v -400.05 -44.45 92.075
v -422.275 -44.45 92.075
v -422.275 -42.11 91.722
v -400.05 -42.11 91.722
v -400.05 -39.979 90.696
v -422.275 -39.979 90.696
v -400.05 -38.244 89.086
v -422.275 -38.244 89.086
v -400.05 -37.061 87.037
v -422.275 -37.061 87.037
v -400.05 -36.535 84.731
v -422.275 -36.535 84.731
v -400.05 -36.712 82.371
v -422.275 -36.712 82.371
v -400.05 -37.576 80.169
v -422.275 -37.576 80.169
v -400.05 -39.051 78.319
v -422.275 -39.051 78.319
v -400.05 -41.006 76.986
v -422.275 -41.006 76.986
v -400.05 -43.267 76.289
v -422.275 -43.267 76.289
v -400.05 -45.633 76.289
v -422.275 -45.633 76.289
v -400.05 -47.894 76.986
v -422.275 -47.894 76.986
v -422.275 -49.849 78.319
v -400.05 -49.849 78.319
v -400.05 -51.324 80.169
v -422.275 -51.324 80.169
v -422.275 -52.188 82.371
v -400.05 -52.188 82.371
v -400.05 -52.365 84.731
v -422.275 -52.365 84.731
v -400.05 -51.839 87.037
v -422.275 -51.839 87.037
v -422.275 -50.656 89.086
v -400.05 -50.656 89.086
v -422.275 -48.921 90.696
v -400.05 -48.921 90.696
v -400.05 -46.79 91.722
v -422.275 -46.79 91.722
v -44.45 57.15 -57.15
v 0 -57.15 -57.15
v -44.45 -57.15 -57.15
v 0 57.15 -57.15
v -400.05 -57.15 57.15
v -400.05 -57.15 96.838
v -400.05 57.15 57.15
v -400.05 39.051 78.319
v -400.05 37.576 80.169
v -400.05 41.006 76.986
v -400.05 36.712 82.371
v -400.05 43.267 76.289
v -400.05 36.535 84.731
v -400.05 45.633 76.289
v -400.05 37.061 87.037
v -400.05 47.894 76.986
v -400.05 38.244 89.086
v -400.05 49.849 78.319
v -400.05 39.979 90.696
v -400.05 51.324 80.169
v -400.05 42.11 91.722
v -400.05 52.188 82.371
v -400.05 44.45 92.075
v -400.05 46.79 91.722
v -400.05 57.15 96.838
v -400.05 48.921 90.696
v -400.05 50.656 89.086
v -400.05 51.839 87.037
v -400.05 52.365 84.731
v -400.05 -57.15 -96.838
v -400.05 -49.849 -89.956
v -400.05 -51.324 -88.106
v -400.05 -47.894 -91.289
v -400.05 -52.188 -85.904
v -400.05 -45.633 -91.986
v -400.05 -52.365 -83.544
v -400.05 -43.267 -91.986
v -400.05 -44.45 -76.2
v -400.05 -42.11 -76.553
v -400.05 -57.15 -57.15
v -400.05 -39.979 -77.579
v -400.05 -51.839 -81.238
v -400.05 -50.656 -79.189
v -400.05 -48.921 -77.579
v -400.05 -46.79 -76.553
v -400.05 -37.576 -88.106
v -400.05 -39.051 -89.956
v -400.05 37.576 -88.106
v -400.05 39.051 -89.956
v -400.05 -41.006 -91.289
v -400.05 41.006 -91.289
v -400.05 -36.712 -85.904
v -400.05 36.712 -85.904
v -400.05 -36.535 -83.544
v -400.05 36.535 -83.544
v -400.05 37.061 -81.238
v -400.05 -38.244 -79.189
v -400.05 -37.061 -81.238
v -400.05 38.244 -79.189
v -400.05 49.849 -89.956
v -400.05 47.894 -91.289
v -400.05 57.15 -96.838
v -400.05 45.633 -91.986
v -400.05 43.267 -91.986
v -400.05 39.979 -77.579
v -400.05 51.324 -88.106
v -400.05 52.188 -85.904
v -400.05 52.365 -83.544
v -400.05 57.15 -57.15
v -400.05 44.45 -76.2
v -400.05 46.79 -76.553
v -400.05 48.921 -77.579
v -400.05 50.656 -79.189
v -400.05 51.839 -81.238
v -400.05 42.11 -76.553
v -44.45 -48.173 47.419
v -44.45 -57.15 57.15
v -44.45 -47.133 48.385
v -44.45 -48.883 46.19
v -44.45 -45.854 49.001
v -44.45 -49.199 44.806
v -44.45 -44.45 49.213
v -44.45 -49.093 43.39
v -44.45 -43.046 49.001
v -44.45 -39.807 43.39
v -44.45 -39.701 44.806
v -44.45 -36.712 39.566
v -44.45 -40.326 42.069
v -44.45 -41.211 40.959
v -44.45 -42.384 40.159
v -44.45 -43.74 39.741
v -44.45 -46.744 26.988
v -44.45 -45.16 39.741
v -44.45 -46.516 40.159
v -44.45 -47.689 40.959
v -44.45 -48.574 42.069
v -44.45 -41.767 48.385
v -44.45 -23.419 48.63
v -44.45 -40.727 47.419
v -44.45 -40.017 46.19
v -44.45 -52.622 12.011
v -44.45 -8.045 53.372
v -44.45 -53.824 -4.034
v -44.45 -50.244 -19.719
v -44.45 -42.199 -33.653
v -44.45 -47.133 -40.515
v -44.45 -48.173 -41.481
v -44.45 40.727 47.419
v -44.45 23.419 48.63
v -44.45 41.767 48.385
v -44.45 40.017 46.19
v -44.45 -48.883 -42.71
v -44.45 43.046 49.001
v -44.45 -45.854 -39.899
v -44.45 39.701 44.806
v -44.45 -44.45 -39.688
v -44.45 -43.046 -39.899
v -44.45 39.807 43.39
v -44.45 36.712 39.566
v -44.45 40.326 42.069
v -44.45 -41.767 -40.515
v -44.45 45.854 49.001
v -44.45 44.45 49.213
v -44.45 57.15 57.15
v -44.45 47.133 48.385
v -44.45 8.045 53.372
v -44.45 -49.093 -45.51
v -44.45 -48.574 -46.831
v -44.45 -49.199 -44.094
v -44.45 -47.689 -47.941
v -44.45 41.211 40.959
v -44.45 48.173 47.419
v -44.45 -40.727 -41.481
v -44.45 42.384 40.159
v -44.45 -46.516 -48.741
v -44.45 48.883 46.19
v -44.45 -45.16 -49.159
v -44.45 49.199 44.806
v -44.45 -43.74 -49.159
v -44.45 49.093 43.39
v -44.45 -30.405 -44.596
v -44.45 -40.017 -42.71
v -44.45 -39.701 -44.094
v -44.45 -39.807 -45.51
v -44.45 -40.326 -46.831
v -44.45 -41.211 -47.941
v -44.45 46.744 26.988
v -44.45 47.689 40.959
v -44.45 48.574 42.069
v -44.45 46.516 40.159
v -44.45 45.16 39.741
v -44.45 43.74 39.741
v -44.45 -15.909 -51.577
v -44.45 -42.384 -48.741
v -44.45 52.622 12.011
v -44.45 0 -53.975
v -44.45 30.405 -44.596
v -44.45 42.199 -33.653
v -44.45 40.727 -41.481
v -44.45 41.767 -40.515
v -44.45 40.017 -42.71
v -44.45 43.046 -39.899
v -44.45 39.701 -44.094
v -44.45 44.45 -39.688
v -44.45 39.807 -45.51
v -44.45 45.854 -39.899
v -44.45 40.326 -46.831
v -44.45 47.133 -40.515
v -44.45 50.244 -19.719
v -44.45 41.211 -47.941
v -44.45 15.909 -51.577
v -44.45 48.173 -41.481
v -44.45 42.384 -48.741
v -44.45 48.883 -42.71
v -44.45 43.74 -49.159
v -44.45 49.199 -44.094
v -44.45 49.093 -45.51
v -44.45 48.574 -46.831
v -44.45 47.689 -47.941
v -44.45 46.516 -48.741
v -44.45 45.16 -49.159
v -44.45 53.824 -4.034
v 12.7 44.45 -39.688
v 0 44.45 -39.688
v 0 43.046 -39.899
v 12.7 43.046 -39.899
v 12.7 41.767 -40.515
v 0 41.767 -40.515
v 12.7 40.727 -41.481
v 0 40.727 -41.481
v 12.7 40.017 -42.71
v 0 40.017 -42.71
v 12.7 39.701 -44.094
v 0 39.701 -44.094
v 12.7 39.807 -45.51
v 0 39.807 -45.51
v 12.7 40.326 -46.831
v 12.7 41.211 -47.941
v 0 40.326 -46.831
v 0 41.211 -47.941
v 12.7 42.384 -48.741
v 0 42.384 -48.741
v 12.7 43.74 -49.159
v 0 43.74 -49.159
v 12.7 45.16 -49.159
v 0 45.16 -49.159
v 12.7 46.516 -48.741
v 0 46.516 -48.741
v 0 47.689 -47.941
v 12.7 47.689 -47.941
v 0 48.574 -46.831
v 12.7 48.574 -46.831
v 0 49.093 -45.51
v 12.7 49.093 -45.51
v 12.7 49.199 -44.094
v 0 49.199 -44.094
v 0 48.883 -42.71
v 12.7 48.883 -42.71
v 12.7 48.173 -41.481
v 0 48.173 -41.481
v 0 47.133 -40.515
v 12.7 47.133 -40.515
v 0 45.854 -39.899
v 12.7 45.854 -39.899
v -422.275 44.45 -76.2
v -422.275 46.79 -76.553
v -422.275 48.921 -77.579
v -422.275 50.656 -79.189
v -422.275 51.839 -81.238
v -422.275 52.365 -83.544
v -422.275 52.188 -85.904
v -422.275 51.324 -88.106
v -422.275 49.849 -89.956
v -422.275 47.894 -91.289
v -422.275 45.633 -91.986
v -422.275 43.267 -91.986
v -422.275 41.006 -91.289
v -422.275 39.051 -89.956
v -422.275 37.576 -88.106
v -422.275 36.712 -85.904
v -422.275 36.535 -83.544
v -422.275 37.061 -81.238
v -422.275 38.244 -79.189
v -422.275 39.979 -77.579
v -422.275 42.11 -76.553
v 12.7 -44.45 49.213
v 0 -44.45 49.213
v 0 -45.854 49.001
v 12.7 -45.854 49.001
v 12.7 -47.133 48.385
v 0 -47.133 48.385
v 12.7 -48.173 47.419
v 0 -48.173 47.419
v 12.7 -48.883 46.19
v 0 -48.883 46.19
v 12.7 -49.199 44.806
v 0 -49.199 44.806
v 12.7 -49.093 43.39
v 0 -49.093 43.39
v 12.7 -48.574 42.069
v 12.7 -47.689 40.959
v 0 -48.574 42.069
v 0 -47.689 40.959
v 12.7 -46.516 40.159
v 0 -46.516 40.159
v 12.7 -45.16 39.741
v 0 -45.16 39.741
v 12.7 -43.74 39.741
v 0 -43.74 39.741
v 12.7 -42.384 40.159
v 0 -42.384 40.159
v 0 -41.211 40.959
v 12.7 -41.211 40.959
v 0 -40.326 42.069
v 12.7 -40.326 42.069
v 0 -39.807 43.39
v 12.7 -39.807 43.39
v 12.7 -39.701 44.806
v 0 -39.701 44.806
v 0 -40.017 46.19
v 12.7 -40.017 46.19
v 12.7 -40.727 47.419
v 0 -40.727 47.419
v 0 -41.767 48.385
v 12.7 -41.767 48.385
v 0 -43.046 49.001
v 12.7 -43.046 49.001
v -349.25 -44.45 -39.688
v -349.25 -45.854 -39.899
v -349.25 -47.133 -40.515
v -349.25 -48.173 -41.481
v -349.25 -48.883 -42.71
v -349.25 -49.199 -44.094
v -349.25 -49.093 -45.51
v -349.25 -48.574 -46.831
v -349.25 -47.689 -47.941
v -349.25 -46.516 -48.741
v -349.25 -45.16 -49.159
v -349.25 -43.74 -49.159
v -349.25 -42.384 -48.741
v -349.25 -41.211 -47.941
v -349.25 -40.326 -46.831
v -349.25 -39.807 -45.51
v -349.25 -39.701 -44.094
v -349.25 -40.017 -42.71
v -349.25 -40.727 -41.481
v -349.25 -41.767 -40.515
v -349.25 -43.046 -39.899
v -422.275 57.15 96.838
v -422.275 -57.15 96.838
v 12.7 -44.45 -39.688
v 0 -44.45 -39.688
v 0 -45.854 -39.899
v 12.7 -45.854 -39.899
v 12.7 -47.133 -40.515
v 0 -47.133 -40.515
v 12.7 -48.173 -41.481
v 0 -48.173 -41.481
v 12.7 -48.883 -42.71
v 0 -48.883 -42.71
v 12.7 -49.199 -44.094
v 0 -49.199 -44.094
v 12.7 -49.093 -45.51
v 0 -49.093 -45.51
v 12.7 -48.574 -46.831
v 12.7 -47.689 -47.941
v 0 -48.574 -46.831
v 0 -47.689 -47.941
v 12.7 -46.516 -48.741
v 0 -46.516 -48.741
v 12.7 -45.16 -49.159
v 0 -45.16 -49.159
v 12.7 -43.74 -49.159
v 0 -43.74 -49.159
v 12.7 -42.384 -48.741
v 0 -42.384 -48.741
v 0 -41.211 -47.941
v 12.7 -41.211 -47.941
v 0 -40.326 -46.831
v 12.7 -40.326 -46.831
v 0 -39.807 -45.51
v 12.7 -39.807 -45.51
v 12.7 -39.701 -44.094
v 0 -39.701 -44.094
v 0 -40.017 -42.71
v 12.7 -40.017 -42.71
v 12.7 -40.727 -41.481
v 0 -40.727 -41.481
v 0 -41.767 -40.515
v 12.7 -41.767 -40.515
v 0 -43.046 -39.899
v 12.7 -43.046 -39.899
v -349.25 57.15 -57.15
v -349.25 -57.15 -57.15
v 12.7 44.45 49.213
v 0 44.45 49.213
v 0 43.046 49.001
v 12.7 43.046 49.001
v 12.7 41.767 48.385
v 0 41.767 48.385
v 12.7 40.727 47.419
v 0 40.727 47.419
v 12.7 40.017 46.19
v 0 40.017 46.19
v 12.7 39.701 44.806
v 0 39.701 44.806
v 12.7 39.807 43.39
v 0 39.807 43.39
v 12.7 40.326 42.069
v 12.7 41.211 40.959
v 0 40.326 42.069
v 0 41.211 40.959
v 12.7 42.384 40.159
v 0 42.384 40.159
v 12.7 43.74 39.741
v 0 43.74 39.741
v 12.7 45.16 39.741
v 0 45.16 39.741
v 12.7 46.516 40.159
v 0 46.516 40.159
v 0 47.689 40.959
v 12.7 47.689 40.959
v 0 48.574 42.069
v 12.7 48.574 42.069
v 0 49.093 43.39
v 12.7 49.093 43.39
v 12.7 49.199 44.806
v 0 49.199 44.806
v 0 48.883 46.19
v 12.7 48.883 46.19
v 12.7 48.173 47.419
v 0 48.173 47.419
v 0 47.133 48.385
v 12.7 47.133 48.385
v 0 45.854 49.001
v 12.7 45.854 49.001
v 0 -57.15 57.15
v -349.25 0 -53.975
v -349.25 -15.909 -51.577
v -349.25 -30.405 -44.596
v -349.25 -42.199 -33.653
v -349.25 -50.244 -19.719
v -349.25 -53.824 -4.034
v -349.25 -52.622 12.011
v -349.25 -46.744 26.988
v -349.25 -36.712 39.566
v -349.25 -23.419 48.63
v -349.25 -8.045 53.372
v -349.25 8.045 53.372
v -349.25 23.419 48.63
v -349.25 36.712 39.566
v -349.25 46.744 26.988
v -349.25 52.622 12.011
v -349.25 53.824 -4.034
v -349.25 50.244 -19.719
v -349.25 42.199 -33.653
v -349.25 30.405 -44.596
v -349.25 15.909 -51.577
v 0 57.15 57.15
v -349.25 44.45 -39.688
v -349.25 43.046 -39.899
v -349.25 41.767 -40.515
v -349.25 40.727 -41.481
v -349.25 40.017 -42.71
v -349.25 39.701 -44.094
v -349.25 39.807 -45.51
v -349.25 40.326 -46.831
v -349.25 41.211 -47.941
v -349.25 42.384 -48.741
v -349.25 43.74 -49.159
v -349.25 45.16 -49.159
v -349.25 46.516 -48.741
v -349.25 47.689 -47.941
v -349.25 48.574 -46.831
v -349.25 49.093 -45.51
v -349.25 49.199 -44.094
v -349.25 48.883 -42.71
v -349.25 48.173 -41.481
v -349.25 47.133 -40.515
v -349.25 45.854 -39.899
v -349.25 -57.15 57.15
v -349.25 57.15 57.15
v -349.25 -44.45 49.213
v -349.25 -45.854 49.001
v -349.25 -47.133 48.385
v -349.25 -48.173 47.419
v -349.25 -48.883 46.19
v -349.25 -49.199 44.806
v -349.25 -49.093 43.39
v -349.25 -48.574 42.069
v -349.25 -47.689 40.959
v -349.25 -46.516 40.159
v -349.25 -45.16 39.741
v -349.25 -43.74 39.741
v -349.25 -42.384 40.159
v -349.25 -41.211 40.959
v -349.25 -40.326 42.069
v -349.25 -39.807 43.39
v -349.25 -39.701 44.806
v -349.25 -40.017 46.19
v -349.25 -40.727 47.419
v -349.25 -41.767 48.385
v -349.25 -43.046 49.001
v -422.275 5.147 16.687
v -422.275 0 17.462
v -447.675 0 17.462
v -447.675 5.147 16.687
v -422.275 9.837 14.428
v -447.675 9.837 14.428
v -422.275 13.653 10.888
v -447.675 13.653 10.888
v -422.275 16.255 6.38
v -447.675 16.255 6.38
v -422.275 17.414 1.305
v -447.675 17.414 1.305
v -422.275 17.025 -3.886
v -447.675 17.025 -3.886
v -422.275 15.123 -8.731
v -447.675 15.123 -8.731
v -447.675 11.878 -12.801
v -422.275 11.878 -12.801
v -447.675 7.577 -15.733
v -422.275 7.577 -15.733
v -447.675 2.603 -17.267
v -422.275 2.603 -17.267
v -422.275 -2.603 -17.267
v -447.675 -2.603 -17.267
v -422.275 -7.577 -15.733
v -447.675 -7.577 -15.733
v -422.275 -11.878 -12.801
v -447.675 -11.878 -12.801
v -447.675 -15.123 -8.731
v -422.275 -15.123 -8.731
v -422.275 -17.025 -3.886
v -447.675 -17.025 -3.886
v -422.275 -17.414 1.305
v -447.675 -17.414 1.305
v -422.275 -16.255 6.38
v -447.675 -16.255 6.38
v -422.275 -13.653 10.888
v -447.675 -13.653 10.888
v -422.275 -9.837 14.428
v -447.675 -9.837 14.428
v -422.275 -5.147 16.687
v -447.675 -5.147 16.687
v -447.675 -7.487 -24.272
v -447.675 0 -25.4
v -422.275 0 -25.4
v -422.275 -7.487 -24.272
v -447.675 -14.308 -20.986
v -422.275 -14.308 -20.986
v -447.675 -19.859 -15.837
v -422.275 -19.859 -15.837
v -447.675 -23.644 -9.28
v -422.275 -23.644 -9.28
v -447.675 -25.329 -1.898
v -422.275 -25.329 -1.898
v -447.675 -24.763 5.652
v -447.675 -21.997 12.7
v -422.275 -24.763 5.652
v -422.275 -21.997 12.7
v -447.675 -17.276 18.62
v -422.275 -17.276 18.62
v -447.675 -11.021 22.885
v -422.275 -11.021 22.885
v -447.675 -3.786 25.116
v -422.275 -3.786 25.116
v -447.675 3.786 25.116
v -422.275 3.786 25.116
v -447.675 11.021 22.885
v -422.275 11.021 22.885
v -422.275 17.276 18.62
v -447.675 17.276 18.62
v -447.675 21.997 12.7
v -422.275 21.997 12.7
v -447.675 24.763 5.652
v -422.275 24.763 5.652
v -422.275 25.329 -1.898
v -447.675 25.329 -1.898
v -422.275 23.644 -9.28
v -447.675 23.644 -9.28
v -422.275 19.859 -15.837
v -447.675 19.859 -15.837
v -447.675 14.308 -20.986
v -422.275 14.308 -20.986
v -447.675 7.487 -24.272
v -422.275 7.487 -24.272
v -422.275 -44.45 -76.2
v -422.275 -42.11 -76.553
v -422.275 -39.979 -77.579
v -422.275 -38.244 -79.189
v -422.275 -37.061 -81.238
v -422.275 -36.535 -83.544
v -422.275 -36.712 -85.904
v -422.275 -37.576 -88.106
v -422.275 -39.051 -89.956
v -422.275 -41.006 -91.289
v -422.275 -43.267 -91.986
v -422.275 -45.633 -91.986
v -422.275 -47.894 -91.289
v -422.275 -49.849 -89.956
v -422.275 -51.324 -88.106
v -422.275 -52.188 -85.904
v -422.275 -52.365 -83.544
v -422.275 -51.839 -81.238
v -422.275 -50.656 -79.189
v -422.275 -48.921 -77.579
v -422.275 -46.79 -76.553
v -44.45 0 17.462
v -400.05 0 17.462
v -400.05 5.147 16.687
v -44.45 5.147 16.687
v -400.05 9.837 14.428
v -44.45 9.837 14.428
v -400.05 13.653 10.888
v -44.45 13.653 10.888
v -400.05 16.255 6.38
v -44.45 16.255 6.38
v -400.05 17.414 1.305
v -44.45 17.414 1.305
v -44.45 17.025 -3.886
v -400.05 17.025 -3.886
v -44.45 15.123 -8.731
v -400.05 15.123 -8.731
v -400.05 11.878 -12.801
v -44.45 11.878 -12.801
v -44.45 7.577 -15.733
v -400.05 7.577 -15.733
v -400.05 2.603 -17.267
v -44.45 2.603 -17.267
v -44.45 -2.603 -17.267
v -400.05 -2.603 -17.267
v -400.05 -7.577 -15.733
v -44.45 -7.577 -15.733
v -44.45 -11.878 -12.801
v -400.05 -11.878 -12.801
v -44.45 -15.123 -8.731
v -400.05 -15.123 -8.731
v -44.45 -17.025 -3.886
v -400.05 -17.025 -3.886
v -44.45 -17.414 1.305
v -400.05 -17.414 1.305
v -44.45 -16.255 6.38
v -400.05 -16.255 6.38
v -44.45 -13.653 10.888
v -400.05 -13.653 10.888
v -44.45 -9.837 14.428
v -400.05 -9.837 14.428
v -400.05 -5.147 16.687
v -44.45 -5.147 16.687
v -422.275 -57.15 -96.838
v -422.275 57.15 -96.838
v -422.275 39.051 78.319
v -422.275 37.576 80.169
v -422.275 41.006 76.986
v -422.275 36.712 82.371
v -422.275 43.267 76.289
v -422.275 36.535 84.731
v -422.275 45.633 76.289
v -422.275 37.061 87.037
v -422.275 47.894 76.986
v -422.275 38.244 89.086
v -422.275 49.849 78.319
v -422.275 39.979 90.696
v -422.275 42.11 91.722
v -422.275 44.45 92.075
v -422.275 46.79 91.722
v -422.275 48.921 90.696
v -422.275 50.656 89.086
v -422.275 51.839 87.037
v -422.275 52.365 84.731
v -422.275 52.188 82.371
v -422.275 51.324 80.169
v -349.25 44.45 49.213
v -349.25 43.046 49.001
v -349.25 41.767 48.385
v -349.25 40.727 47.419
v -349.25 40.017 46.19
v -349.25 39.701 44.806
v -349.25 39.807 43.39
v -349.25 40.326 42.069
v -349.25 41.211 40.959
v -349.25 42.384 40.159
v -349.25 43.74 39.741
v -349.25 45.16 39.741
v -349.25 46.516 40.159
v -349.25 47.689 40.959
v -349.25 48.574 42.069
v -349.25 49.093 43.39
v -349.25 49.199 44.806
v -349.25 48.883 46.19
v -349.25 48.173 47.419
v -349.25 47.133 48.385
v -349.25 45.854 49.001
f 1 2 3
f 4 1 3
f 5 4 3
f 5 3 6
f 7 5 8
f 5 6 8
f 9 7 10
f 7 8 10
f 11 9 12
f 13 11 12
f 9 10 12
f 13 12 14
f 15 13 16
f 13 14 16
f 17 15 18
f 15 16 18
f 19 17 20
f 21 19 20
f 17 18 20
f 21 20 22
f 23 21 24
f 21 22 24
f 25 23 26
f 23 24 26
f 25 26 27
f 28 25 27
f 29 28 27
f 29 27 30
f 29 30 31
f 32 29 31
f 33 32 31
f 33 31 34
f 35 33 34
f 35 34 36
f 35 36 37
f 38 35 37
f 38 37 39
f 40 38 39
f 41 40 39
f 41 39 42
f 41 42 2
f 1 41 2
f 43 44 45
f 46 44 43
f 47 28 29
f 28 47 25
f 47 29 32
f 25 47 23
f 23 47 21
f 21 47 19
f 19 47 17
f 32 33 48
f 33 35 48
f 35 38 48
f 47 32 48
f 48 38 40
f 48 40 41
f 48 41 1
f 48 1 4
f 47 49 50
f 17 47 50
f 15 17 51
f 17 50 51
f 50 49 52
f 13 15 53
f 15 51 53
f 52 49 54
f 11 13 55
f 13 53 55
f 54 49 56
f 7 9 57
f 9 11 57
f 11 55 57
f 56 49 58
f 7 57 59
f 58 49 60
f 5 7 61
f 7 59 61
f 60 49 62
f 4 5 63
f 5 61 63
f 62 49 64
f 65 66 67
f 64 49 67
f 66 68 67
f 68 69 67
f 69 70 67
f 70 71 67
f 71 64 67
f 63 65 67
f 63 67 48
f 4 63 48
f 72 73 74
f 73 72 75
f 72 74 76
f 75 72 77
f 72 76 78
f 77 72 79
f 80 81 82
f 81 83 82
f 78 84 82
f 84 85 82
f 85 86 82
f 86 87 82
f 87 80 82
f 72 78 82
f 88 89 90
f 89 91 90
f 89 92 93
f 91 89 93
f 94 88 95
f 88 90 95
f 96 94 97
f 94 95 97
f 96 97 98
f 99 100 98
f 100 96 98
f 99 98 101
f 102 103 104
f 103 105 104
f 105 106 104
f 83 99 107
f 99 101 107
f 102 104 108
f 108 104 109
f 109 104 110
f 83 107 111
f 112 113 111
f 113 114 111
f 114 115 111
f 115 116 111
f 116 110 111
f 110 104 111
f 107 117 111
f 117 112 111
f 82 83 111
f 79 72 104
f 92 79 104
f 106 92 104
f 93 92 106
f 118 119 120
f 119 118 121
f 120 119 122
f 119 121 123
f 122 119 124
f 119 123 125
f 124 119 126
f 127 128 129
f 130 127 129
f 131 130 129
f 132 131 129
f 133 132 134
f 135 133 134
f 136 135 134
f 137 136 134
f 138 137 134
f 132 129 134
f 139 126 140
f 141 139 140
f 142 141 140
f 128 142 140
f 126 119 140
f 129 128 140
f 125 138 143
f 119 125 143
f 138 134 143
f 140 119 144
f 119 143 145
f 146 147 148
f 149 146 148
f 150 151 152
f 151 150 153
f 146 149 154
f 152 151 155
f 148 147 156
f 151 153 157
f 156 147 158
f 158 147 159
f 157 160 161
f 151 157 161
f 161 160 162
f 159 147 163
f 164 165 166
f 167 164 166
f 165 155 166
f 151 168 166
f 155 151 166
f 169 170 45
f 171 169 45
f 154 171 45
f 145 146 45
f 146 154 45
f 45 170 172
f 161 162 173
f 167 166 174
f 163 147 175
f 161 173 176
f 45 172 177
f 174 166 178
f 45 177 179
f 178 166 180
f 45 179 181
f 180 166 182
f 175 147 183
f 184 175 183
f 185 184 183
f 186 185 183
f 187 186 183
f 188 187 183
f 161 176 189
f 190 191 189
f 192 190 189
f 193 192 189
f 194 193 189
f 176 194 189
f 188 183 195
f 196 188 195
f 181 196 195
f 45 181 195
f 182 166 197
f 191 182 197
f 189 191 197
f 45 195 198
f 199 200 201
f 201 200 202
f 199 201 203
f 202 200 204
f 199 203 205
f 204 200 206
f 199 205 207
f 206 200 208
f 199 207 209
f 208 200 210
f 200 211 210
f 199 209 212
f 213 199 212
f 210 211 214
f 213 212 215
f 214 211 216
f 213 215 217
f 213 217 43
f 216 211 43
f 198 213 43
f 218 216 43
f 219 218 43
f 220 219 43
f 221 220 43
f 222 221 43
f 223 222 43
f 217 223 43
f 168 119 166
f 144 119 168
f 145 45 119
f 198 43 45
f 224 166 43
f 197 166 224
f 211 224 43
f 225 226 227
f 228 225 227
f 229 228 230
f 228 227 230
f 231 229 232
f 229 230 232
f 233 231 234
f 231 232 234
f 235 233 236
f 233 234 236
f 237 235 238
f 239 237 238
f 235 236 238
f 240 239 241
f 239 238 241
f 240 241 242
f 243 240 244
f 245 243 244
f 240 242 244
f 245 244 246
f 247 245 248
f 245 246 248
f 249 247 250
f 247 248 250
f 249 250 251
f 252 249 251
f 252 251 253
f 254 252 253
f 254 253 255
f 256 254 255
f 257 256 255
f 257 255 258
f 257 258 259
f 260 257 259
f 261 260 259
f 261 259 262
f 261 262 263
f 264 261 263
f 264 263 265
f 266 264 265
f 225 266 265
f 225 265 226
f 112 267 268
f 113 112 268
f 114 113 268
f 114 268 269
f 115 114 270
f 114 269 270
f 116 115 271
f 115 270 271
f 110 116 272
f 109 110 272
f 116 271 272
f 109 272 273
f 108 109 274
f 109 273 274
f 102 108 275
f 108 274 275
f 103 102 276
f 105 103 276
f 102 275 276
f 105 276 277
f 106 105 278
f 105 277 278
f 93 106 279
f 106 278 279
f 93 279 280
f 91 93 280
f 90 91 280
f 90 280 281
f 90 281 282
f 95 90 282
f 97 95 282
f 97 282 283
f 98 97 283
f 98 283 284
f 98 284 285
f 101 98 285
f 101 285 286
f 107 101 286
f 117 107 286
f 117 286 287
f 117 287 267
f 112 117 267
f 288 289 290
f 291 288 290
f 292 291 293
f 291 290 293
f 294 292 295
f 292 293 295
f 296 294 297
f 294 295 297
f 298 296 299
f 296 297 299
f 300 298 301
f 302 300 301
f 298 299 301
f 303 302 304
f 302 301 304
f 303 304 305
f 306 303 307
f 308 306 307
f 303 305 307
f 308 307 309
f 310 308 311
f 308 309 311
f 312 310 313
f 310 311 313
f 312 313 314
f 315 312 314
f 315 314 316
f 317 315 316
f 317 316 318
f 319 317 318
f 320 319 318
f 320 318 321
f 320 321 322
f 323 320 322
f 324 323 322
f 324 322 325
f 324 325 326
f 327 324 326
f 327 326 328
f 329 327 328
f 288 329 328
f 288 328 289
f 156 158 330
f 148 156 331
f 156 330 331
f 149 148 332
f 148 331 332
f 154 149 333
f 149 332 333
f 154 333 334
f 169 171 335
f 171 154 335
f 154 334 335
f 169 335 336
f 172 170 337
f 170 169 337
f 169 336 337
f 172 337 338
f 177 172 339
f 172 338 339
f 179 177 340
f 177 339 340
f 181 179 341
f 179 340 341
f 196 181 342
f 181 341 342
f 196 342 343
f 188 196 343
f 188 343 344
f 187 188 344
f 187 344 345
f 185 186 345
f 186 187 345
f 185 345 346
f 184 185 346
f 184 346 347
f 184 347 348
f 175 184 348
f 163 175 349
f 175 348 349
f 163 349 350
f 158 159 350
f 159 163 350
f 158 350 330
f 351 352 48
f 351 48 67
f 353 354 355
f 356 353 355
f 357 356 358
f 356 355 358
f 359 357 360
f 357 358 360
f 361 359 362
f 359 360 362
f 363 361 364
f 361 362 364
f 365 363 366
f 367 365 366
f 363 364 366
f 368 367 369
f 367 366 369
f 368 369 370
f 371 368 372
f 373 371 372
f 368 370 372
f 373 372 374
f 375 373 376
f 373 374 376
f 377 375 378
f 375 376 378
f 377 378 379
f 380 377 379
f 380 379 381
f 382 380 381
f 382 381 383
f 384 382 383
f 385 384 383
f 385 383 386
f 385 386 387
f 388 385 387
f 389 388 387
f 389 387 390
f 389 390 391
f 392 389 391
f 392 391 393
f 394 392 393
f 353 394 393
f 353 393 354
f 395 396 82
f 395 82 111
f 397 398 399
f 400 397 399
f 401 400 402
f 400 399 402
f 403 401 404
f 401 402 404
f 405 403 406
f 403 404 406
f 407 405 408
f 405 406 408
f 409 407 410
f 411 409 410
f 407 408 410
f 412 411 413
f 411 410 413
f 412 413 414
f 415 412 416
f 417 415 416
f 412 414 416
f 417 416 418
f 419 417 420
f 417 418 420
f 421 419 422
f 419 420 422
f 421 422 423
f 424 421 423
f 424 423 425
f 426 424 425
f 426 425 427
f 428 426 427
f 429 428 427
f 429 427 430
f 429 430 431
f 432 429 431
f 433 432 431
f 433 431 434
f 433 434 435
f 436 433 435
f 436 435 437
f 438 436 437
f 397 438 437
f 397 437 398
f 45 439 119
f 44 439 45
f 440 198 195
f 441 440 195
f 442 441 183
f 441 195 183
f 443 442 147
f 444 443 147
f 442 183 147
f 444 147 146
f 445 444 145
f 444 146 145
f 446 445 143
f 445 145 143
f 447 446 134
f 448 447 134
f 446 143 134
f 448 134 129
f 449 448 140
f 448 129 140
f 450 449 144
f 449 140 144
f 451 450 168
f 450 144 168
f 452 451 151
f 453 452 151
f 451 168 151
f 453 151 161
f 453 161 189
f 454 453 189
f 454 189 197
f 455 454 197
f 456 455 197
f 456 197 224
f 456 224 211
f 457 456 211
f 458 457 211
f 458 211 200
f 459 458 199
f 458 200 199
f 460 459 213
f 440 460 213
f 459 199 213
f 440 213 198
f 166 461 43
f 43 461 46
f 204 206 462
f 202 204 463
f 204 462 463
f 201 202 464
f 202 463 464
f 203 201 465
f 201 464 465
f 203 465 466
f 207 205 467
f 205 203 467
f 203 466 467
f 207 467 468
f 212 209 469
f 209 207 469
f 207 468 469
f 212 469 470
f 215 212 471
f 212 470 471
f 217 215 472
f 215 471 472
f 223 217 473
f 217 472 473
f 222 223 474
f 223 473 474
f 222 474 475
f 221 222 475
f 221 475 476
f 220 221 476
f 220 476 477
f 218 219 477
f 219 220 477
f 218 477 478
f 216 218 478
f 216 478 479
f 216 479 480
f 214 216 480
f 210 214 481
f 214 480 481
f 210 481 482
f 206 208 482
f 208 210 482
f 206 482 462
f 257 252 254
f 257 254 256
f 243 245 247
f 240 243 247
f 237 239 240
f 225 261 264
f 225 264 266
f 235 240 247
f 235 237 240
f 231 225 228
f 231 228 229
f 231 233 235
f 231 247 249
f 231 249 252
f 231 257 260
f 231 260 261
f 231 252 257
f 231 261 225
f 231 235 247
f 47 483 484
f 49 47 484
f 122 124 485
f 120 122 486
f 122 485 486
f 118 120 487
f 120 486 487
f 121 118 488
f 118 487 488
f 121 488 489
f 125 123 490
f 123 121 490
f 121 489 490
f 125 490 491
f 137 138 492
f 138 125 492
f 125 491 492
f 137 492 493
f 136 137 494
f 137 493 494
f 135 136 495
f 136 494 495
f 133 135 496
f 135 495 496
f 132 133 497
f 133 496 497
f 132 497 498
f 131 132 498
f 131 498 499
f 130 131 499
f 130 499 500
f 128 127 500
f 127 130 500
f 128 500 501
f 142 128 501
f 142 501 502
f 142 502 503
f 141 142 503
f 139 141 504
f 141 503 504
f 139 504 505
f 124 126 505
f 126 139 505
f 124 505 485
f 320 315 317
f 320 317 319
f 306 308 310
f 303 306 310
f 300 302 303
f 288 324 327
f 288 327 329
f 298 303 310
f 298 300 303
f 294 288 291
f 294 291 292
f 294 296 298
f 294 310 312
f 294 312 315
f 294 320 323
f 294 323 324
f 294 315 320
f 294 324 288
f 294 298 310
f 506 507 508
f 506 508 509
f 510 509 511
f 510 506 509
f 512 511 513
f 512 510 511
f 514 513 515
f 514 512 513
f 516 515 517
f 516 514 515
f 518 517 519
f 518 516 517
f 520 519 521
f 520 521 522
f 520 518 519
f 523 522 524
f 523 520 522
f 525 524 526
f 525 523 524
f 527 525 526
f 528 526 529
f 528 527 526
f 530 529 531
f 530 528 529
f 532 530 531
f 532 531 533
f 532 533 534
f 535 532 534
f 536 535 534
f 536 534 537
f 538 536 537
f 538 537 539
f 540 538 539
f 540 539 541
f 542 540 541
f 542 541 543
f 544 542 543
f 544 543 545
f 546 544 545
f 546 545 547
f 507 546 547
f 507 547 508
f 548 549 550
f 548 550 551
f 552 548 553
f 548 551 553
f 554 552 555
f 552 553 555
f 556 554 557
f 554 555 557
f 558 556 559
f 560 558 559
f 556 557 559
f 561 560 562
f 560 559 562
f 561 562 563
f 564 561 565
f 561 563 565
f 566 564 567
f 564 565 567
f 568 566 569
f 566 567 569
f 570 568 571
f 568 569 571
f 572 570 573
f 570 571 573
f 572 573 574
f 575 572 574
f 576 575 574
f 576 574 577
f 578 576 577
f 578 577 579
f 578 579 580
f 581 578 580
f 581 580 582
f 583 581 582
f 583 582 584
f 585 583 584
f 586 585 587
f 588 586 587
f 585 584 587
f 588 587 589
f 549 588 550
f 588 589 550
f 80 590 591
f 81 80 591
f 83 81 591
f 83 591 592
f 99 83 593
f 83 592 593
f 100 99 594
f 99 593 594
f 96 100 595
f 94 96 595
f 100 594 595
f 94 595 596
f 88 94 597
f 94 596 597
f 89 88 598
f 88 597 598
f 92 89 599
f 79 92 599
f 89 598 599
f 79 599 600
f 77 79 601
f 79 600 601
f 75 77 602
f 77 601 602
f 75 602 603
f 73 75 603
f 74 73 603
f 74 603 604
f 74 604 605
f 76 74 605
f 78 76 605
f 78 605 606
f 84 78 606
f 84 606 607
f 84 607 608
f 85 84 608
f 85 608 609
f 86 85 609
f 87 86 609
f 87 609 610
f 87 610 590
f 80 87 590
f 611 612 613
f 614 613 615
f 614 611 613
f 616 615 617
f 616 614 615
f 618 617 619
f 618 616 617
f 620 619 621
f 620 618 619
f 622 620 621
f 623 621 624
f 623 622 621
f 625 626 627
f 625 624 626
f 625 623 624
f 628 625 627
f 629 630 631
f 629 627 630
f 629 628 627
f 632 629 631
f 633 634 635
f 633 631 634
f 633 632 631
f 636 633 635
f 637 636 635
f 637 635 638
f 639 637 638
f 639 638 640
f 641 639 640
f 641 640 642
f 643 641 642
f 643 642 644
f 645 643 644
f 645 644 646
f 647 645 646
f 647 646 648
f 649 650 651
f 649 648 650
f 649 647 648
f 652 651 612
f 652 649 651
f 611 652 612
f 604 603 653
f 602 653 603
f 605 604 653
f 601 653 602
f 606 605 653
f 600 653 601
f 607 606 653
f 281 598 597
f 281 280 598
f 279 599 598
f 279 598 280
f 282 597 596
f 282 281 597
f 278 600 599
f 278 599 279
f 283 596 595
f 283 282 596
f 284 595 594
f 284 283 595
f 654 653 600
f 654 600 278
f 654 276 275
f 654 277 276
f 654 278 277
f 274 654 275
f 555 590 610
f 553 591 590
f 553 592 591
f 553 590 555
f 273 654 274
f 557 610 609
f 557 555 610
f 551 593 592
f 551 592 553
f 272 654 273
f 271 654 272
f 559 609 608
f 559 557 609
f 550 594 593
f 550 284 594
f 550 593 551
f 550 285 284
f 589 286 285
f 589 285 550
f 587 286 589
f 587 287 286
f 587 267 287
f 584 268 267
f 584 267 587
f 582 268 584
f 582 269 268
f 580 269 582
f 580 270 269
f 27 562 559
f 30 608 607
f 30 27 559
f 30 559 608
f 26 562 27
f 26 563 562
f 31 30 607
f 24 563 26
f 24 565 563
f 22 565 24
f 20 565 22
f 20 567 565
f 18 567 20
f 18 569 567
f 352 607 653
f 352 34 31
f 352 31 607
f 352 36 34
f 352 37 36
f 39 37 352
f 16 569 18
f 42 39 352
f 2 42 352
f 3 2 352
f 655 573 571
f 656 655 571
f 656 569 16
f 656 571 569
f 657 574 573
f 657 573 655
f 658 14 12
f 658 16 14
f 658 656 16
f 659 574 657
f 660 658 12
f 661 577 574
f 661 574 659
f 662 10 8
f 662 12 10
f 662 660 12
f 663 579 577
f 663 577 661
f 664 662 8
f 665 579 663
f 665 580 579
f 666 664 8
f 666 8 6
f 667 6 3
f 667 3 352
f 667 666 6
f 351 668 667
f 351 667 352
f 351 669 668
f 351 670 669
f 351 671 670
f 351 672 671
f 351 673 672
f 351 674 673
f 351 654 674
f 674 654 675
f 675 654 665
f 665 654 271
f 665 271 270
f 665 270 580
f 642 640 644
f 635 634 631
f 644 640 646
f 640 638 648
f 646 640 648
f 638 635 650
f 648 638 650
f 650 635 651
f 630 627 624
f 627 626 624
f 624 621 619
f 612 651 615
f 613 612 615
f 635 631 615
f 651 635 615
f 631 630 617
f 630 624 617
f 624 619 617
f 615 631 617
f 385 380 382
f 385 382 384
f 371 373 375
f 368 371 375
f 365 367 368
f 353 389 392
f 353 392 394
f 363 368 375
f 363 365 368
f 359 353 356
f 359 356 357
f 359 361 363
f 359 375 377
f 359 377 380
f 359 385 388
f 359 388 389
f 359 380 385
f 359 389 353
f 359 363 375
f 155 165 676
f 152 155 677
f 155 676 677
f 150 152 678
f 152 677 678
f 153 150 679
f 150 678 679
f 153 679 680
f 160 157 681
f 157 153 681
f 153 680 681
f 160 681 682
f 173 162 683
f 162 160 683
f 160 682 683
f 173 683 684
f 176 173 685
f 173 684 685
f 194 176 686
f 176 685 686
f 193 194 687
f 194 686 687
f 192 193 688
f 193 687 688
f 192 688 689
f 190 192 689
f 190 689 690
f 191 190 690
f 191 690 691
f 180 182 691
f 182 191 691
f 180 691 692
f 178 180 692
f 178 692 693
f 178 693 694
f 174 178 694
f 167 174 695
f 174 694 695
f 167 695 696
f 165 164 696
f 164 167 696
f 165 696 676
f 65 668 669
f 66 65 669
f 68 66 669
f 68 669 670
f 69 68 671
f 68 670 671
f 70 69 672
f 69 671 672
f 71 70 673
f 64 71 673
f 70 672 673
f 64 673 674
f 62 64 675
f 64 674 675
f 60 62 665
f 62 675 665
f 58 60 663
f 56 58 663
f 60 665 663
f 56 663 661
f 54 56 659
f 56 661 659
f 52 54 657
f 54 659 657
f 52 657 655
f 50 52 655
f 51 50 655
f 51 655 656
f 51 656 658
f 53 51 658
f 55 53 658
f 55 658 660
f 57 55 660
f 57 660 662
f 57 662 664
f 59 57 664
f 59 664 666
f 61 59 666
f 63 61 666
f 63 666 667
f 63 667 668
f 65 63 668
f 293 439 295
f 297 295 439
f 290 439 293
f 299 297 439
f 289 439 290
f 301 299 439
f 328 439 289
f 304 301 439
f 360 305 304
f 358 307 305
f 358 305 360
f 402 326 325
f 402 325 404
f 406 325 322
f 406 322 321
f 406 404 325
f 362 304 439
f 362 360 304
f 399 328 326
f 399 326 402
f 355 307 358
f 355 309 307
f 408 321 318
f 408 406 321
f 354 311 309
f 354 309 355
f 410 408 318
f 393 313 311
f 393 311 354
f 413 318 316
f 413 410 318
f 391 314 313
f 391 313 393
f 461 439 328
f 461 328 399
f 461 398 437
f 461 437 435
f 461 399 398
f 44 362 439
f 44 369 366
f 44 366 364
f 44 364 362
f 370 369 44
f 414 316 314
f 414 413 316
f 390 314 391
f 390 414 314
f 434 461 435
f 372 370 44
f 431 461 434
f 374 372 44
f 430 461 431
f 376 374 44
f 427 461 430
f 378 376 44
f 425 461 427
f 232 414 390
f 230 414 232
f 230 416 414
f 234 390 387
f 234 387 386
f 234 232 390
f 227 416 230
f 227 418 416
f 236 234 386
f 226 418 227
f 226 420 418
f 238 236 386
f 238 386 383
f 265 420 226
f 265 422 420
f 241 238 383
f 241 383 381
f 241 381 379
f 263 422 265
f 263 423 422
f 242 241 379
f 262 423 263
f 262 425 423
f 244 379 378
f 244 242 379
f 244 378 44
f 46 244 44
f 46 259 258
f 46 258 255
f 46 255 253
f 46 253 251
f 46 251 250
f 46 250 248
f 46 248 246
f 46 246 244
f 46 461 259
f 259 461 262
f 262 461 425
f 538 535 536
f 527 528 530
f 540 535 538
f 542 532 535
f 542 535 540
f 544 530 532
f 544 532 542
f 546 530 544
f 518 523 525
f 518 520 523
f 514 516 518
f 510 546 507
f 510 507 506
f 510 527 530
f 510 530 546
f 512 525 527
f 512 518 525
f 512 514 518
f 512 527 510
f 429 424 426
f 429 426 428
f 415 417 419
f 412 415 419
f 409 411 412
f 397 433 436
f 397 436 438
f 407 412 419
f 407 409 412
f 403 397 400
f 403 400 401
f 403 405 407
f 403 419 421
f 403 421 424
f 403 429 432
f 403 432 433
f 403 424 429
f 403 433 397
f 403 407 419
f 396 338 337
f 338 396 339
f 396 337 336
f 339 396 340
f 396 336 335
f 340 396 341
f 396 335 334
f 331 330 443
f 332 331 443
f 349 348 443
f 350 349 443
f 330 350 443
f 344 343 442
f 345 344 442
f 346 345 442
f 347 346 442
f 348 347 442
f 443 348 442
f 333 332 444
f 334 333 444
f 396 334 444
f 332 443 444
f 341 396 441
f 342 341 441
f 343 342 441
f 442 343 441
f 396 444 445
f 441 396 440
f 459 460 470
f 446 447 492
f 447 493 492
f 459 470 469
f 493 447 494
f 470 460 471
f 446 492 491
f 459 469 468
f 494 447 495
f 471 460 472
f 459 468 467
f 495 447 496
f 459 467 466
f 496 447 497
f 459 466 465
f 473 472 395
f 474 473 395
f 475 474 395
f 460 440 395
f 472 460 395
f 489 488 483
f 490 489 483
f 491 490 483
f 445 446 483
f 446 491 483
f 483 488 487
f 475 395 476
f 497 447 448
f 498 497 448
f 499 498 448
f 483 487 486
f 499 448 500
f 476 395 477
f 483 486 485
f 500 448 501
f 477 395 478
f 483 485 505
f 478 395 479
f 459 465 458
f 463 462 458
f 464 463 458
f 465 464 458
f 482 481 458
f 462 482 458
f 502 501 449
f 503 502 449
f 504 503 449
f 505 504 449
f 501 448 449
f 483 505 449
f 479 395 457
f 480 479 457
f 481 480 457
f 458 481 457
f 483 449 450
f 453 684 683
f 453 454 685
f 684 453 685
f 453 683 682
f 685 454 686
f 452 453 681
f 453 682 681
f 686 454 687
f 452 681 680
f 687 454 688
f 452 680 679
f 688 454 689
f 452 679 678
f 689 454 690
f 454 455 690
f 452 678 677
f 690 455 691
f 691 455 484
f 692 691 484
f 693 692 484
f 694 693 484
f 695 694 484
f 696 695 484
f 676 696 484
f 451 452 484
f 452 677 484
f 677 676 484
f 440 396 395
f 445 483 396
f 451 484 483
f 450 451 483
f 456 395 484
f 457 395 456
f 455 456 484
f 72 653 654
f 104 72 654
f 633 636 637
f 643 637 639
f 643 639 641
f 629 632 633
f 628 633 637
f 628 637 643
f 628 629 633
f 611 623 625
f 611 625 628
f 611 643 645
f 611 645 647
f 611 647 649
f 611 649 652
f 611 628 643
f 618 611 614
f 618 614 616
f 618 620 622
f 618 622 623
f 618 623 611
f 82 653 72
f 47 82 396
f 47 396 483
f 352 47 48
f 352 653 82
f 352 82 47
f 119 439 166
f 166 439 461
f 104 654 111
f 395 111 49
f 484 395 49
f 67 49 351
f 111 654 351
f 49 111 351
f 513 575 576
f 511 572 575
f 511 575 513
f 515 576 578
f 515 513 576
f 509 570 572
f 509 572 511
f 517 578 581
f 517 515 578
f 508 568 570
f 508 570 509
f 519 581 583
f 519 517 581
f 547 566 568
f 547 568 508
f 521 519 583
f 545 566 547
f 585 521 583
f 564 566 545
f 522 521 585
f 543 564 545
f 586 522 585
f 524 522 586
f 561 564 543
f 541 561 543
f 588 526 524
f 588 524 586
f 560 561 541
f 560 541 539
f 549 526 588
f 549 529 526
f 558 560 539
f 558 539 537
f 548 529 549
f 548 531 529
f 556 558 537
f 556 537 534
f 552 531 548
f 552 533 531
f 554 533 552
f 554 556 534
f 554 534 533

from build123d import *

# Parameters (mm, degrees)
SKETCH1_W            = 114.3
SKETCH1_H            = 114.3
BASE_EXTRUDE_DEPTH   = 44.45
SKETCH2_R            = 53.975
BOSS_EXTRUDE1_DEPTH  = 304.8
SKETCH3_W            = 114.3
SKETCH3_H            = 114.3
BOSS_EXTRUDE2_DEPTH  = 73.025
SKETCH4_R            = 25.4
BOSS_EXTRUDE3_DEPTH  = 25.4
CUT_EXTRUDE1_START   = -403.225
SKETCH5_R            = 17.4625
CUT_EXTRUDE1_DEPTH   = 403.225
SKETCH6_R            = 4.7625
BOSS_EXTRUDE4_DEPTH  = 361.95
SKETCH7_W            = 193.675
SKETCH7_H            = 114.3
BOSS_EXTRUDE5_DEPTH  = 22.225
CUT_EXTRUDE2_REACH   = 451.274
SKETCH8_R            = 7.9375
LPATTERN2_COUNT      = 2
LPATTERN2_PITCH      = 168.275
LPATTERN2_COUNT_DIR2 = 2
LPATTERN2_PITCH_DIR2 = 88.9


with BuildPart() as part:
    # Sketch1 → Base-Extrude (new body)
    with BuildSketch(Plane(origin=(0, 0, 0), x_dir=(0, 0, -1), z_dir=(1, 0, 0))):
        Rectangle(SKETCH1_W, SKETCH1_H)
    extrude(amount=-BASE_EXTRUDE_DEPTH)

    # Sketch2 → Boss-Extrude1 (add)
    with BuildSketch(Plane.ZY.offset(44.45)):
        with Locations(Location((0, 0, 0), (0, 0, 180))):
            Circle(SKETCH2_R)
    extrude(amount=BOSS_EXTRUDE1_DEPTH)

    # Sketch3 → Boss-Extrude2 (add)
    with BuildSketch(Plane.ZY.offset(349.25)):
        Rectangle(SKETCH3_W, SKETCH3_H)
    extrude(amount=BOSS_EXTRUDE2_DEPTH)

    # Sketch4 → Boss-Extrude3 (add)
    with BuildSketch(Plane.ZY.offset(422.275)):
        with Locations(Location((0, 0, 0), (0, 0, 180))):
            Circle(SKETCH4_R)
    extrude(amount=BOSS_EXTRUDE3_DEPTH)

    # Sketch5 → Cut-Extrude1 (cut)
    with BuildSketch(Plane.ZY.offset(447.675).offset(CUT_EXTRUDE1_START)):
        Circle(SKETCH5_R)
    extrude(amount=CUT_EXTRUDE1_DEPTH, mode=Mode.SUBTRACT)

    # Sketch6 → Boss-Extrude4 (add)
    with BuildSketch(Plane(origin=(-349.25, 0, 0), x_dir=(0, 0, -1), z_dir=(1, 0, 0))):
        with Locations(Location((-44.45, 44.45, 0), (0, 0, 180))):
            Circle(SKETCH6_R)
        with Locations(Location((44.45, 44.45, 0), (0, 0, 180))):
            Circle(SKETCH6_R)
        with Locations(Location((44.45, -44.45, 0), (0, 0, 180))):
            Circle(SKETCH6_R)
        with Locations(Location((-44.45, -44.45, 0), (0, 0, 180))):
            Circle(SKETCH6_R)
    extrude(amount=BOSS_EXTRUDE4_DEPTH)

    # Sketch7 → Boss-Extrude5 (add)
    with BuildSketch(Plane.ZY.offset(422.275)):
        Rectangle(SKETCH7_W, SKETCH7_H)
    extrude(amount=-BOSS_EXTRUDE5_DEPTH)

    # Sketch8 → Cut-Extrude2 (cut, up to next)
    with BuildSketch(Plane.ZY.offset(422.275), mode=Mode.PRIVATE) as cut_extrude2_sk1:
        with Locations((84.1375, -44.45)):
            Circle(SKETCH8_R)
    cut_extrude2_tool1 = extrude(cut_extrude2_sk1.sketch, amount=-CUT_EXTRUDE2_REACH, mode=Mode.PRIVATE) & part.part
    cut_extrude2 = cut_extrude2_tool1.solids().sort_by_distance((-422.275, -44.45, 84.1375))[0]
    add(cut_extrude2, mode=Mode.SUBTRACT)

    # LPattern2: Cut-Extrude2 2 × 2
    with Locations(*[(0, j * LPATTERN2_PITCH_DIR2, -i * LPATTERN2_PITCH) for i in range(LPATTERN2_COUNT) for j in range(LPATTERN2_COUNT_DIR2) if (i, j) != (0, 0)]):
        add(cut_extrude2, mode=Mode.SUBTRACT)


solid = part.part
